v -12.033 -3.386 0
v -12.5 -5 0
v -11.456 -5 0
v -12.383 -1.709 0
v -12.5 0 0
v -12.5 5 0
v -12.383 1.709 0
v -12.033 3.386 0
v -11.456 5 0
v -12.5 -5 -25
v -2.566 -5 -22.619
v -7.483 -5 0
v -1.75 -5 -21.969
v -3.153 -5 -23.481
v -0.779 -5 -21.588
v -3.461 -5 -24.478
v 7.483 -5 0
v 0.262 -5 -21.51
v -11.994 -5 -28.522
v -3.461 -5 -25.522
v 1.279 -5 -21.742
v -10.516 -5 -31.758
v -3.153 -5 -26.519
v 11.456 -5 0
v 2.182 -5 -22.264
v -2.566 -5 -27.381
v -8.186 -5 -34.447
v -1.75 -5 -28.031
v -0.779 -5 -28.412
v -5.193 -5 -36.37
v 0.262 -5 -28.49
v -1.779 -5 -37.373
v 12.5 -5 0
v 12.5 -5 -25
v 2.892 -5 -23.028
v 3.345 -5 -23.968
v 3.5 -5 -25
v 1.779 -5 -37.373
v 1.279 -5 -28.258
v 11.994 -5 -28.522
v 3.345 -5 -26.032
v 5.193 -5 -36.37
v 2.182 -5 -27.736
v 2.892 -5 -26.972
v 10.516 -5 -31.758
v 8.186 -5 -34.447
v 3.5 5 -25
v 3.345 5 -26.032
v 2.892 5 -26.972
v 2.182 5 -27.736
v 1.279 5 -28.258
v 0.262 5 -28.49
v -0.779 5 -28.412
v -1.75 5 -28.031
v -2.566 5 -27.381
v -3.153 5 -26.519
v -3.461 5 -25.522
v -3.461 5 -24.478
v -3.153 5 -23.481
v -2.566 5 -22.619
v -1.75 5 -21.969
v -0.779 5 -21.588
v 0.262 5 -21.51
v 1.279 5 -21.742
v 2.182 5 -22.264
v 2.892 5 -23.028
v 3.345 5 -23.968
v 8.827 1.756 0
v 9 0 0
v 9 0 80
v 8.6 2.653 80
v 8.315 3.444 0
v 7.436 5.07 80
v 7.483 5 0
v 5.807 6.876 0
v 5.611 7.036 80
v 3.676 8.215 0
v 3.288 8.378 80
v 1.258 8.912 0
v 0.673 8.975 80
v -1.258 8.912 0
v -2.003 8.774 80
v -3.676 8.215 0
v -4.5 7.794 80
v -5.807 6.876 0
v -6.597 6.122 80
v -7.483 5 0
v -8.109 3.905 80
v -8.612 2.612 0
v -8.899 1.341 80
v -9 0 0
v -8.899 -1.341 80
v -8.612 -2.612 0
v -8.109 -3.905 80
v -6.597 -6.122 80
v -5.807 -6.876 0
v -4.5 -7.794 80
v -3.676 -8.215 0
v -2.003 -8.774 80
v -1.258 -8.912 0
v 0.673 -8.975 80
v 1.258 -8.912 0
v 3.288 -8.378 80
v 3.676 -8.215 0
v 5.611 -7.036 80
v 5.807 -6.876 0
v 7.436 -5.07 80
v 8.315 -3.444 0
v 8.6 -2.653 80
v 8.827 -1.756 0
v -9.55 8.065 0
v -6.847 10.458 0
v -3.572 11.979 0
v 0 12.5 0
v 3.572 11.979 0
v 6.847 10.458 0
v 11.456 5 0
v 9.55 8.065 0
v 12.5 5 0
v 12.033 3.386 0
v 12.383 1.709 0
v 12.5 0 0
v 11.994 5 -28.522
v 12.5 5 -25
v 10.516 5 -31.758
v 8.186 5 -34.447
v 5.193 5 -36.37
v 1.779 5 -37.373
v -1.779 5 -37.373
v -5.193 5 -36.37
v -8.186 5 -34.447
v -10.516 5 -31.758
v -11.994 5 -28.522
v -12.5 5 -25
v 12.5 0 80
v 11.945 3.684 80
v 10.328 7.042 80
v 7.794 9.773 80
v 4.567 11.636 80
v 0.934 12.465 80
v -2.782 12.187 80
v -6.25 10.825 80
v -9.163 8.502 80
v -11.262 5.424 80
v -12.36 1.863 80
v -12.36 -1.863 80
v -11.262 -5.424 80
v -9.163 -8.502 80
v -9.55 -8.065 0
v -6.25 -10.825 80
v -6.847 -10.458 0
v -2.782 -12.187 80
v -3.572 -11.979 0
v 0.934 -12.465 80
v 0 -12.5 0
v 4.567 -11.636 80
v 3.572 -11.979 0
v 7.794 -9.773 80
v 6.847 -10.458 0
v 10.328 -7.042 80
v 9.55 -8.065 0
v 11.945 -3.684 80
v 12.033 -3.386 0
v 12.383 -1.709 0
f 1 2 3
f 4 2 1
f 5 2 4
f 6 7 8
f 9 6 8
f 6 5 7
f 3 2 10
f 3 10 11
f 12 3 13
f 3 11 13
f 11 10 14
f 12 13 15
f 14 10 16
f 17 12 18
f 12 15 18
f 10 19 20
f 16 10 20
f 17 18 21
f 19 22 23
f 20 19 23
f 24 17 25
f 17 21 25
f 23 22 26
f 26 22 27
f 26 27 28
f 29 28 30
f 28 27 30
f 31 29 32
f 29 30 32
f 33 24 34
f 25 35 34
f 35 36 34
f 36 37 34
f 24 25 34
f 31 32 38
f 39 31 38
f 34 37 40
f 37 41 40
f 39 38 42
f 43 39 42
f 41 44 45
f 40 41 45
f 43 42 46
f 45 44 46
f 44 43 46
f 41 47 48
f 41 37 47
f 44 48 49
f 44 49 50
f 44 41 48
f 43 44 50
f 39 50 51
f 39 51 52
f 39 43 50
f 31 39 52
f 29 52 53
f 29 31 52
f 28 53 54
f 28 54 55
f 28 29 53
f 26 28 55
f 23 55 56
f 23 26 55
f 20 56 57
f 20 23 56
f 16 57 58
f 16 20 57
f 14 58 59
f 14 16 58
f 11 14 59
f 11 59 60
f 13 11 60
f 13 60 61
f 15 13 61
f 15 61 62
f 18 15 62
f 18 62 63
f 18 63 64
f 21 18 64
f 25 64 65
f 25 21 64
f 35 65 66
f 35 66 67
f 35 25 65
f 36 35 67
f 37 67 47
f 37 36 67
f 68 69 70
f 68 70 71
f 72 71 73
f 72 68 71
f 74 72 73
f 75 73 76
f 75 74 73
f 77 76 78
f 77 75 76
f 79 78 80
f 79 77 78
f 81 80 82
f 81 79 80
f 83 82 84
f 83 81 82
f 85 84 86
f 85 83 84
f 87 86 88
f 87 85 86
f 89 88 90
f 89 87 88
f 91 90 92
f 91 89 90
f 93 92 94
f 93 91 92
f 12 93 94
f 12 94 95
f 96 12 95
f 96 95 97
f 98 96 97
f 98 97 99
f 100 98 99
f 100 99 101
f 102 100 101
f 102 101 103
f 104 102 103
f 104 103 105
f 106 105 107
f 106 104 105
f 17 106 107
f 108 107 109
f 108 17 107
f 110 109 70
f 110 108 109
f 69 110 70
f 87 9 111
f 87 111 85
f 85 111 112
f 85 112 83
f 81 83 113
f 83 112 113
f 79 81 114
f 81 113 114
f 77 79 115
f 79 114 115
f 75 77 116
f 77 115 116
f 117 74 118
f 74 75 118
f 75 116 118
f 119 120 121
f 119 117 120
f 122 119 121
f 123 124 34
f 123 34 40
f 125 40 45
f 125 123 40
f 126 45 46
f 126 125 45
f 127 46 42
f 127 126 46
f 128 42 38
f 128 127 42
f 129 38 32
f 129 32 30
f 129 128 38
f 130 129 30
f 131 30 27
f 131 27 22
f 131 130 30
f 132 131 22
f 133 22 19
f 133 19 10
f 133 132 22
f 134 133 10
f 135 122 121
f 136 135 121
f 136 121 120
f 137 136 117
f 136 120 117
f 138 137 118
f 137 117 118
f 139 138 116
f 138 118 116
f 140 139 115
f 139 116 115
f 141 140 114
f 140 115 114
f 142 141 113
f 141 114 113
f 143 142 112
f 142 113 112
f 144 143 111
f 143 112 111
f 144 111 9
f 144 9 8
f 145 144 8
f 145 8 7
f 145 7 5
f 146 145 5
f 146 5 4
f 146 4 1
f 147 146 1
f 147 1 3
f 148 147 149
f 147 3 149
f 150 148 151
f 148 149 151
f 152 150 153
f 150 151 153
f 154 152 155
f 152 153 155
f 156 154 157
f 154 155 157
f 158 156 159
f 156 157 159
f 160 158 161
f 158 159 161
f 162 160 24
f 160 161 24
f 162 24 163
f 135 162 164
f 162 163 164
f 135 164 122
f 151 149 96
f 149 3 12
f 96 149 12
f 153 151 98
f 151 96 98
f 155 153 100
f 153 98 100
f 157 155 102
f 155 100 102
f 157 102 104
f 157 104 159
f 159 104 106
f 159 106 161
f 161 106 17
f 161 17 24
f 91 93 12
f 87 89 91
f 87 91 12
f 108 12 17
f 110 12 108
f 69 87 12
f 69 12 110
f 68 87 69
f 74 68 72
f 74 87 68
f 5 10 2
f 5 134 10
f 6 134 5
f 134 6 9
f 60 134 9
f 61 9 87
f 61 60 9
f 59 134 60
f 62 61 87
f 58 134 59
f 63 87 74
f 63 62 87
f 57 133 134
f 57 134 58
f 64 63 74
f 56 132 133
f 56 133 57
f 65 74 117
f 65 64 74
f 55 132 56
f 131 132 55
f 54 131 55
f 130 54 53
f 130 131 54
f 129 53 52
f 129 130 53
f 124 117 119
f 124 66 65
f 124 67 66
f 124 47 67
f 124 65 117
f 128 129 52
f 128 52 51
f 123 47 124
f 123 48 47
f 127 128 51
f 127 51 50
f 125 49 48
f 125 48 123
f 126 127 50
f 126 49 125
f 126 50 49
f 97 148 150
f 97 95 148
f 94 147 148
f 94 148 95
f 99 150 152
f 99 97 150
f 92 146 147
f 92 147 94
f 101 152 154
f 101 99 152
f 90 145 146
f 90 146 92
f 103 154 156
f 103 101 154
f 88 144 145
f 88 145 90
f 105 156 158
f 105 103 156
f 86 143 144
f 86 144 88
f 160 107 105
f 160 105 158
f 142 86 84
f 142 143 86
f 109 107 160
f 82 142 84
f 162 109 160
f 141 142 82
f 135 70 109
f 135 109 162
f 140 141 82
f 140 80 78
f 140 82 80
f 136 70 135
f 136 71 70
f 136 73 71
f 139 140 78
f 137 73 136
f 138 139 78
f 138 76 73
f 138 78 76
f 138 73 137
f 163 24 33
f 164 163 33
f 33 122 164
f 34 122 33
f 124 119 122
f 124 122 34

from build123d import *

# Parameters (mm, degrees)
SKETCH1_R           = 12.5
SKETCH1_R_2         = 9
BOSS_EXTRUDE1_DEPTH = 80
SKETCH2_R           = 3.5
BOSS_EXTRUDE2_DEPTH = 5


with BuildPart() as part:
    # Sketch1 → Boss-Extrude1 (new body)
    with BuildSketch(Plane.XY):
        Circle(SKETCH1_R)
        Circle(SKETCH1_R_2, mode=Mode.SUBTRACT)
    extrude(amount=BOSS_EXTRUDE1_DEPTH)

    # Sketch2 → Boss-Extrude2 (add, symmetric)
    with BuildSketch(Plane(origin=(0, 0, 0), x_dir=(1, 0, 0), z_dir=(0, 1, 0))):
        with BuildLine():
            Line((-12.5, 0), (12.5, 0))
            Line((12.5, 0), (12.5, 25))
            ThreePointArc((12.5, 25), (0, 37.5), (-12.5, 25))
            Line((-12.5, 25), (-12.5, 0))
        make_face()
        with Locations((0, 25)):
            Circle(SKETCH2_R, mode=Mode.SUBTRACT)
    extrude(amount=BOSS_EXTRUDE2_DEPTH, both=True)


solid = part.part
